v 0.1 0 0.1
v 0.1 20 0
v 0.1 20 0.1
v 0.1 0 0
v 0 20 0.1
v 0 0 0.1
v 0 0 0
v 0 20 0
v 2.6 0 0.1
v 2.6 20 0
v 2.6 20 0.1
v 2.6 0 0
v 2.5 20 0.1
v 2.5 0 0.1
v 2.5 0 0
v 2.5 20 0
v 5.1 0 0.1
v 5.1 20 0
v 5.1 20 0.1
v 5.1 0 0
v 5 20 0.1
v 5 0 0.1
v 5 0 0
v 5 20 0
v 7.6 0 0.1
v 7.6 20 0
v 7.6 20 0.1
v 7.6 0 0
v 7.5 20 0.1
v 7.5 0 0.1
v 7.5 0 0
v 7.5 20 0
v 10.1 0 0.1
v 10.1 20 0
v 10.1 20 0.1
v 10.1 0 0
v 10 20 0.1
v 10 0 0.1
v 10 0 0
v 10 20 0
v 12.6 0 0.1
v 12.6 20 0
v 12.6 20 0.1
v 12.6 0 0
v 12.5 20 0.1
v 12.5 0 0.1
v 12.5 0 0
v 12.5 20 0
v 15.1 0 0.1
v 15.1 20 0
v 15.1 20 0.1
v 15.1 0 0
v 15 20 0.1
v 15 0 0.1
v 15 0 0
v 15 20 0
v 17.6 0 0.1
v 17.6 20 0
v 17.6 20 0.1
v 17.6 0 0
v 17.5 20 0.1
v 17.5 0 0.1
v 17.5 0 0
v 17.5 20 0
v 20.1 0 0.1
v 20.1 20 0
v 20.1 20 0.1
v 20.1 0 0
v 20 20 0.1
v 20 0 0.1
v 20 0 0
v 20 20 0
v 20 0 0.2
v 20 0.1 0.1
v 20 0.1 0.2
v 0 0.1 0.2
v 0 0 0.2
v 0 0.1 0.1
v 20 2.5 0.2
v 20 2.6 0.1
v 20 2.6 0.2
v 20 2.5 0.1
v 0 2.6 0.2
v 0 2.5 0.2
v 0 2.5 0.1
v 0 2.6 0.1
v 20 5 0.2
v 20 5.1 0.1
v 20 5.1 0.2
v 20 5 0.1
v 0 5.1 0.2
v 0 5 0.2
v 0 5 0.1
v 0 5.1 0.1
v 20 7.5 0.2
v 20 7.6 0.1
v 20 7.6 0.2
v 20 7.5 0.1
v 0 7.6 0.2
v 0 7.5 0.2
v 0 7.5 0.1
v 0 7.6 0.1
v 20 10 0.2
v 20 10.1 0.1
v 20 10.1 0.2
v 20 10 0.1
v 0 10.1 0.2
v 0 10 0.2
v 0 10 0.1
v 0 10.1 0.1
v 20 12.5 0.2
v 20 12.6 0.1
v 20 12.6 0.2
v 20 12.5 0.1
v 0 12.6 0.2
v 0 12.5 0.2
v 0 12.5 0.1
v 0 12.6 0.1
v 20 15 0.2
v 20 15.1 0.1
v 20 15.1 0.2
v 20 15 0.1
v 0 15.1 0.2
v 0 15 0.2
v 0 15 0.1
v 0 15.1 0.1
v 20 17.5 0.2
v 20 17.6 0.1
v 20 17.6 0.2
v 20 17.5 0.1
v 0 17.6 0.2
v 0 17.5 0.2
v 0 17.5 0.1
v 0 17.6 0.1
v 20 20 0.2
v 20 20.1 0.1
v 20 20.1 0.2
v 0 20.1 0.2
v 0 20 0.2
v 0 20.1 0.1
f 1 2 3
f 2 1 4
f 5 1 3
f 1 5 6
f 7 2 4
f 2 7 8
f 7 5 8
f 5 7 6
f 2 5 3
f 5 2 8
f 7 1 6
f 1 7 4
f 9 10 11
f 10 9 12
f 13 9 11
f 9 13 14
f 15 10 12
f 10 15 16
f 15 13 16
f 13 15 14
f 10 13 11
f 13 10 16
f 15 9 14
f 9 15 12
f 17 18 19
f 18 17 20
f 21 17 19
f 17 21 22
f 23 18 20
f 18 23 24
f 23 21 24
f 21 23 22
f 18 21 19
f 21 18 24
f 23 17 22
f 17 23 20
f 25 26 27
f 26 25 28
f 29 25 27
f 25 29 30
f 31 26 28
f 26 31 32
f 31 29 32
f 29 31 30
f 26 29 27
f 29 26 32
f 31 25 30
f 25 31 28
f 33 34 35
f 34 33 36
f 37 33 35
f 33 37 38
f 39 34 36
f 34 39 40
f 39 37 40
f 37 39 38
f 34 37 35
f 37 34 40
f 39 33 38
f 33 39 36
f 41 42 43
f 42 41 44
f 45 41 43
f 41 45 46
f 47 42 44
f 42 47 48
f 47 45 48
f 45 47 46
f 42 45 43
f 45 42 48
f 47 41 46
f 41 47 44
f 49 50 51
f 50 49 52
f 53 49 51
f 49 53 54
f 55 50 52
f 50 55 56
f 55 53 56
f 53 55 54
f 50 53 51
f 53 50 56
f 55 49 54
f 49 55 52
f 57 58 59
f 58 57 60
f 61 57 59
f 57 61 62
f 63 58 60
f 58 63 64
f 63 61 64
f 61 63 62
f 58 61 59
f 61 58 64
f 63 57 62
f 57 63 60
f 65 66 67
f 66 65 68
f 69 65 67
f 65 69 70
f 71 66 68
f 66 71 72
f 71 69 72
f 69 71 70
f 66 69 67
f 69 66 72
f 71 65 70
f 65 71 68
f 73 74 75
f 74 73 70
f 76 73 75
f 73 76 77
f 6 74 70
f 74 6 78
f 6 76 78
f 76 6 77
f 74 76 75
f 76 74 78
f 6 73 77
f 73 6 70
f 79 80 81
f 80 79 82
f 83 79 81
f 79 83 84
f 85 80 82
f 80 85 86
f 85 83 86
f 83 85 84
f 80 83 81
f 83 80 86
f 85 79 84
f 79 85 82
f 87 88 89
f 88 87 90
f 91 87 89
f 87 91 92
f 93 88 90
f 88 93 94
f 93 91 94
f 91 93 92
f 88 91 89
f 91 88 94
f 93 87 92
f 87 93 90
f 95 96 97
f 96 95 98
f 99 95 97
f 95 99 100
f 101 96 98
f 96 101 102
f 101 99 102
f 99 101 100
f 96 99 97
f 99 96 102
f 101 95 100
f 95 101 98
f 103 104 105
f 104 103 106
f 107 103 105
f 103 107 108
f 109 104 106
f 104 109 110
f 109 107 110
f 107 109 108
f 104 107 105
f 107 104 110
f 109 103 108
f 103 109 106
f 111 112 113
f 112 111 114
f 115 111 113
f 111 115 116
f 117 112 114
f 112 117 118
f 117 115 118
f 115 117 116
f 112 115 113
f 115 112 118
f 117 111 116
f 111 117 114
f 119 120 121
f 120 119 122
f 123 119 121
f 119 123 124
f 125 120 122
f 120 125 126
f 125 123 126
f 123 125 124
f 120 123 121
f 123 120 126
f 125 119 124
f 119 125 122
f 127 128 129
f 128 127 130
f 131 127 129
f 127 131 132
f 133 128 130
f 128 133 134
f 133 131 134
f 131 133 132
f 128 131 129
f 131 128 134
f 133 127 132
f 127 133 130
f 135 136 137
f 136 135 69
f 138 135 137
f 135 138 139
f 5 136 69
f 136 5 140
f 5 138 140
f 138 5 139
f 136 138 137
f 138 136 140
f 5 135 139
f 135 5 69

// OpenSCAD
n=1/2.5;
x=20;
y=20;
layer=0.1;
layers=2;

for(z=[0:layers-1]) translate([0,0,layer*z])
for(i=[0:n*x]) if(z%2==0){
	translate([1/n,0,0]*i) cube([layer,y,layer]);
}
else{
	translate([0,1/n,0]*i) cube([x,layer,layer]);
}
